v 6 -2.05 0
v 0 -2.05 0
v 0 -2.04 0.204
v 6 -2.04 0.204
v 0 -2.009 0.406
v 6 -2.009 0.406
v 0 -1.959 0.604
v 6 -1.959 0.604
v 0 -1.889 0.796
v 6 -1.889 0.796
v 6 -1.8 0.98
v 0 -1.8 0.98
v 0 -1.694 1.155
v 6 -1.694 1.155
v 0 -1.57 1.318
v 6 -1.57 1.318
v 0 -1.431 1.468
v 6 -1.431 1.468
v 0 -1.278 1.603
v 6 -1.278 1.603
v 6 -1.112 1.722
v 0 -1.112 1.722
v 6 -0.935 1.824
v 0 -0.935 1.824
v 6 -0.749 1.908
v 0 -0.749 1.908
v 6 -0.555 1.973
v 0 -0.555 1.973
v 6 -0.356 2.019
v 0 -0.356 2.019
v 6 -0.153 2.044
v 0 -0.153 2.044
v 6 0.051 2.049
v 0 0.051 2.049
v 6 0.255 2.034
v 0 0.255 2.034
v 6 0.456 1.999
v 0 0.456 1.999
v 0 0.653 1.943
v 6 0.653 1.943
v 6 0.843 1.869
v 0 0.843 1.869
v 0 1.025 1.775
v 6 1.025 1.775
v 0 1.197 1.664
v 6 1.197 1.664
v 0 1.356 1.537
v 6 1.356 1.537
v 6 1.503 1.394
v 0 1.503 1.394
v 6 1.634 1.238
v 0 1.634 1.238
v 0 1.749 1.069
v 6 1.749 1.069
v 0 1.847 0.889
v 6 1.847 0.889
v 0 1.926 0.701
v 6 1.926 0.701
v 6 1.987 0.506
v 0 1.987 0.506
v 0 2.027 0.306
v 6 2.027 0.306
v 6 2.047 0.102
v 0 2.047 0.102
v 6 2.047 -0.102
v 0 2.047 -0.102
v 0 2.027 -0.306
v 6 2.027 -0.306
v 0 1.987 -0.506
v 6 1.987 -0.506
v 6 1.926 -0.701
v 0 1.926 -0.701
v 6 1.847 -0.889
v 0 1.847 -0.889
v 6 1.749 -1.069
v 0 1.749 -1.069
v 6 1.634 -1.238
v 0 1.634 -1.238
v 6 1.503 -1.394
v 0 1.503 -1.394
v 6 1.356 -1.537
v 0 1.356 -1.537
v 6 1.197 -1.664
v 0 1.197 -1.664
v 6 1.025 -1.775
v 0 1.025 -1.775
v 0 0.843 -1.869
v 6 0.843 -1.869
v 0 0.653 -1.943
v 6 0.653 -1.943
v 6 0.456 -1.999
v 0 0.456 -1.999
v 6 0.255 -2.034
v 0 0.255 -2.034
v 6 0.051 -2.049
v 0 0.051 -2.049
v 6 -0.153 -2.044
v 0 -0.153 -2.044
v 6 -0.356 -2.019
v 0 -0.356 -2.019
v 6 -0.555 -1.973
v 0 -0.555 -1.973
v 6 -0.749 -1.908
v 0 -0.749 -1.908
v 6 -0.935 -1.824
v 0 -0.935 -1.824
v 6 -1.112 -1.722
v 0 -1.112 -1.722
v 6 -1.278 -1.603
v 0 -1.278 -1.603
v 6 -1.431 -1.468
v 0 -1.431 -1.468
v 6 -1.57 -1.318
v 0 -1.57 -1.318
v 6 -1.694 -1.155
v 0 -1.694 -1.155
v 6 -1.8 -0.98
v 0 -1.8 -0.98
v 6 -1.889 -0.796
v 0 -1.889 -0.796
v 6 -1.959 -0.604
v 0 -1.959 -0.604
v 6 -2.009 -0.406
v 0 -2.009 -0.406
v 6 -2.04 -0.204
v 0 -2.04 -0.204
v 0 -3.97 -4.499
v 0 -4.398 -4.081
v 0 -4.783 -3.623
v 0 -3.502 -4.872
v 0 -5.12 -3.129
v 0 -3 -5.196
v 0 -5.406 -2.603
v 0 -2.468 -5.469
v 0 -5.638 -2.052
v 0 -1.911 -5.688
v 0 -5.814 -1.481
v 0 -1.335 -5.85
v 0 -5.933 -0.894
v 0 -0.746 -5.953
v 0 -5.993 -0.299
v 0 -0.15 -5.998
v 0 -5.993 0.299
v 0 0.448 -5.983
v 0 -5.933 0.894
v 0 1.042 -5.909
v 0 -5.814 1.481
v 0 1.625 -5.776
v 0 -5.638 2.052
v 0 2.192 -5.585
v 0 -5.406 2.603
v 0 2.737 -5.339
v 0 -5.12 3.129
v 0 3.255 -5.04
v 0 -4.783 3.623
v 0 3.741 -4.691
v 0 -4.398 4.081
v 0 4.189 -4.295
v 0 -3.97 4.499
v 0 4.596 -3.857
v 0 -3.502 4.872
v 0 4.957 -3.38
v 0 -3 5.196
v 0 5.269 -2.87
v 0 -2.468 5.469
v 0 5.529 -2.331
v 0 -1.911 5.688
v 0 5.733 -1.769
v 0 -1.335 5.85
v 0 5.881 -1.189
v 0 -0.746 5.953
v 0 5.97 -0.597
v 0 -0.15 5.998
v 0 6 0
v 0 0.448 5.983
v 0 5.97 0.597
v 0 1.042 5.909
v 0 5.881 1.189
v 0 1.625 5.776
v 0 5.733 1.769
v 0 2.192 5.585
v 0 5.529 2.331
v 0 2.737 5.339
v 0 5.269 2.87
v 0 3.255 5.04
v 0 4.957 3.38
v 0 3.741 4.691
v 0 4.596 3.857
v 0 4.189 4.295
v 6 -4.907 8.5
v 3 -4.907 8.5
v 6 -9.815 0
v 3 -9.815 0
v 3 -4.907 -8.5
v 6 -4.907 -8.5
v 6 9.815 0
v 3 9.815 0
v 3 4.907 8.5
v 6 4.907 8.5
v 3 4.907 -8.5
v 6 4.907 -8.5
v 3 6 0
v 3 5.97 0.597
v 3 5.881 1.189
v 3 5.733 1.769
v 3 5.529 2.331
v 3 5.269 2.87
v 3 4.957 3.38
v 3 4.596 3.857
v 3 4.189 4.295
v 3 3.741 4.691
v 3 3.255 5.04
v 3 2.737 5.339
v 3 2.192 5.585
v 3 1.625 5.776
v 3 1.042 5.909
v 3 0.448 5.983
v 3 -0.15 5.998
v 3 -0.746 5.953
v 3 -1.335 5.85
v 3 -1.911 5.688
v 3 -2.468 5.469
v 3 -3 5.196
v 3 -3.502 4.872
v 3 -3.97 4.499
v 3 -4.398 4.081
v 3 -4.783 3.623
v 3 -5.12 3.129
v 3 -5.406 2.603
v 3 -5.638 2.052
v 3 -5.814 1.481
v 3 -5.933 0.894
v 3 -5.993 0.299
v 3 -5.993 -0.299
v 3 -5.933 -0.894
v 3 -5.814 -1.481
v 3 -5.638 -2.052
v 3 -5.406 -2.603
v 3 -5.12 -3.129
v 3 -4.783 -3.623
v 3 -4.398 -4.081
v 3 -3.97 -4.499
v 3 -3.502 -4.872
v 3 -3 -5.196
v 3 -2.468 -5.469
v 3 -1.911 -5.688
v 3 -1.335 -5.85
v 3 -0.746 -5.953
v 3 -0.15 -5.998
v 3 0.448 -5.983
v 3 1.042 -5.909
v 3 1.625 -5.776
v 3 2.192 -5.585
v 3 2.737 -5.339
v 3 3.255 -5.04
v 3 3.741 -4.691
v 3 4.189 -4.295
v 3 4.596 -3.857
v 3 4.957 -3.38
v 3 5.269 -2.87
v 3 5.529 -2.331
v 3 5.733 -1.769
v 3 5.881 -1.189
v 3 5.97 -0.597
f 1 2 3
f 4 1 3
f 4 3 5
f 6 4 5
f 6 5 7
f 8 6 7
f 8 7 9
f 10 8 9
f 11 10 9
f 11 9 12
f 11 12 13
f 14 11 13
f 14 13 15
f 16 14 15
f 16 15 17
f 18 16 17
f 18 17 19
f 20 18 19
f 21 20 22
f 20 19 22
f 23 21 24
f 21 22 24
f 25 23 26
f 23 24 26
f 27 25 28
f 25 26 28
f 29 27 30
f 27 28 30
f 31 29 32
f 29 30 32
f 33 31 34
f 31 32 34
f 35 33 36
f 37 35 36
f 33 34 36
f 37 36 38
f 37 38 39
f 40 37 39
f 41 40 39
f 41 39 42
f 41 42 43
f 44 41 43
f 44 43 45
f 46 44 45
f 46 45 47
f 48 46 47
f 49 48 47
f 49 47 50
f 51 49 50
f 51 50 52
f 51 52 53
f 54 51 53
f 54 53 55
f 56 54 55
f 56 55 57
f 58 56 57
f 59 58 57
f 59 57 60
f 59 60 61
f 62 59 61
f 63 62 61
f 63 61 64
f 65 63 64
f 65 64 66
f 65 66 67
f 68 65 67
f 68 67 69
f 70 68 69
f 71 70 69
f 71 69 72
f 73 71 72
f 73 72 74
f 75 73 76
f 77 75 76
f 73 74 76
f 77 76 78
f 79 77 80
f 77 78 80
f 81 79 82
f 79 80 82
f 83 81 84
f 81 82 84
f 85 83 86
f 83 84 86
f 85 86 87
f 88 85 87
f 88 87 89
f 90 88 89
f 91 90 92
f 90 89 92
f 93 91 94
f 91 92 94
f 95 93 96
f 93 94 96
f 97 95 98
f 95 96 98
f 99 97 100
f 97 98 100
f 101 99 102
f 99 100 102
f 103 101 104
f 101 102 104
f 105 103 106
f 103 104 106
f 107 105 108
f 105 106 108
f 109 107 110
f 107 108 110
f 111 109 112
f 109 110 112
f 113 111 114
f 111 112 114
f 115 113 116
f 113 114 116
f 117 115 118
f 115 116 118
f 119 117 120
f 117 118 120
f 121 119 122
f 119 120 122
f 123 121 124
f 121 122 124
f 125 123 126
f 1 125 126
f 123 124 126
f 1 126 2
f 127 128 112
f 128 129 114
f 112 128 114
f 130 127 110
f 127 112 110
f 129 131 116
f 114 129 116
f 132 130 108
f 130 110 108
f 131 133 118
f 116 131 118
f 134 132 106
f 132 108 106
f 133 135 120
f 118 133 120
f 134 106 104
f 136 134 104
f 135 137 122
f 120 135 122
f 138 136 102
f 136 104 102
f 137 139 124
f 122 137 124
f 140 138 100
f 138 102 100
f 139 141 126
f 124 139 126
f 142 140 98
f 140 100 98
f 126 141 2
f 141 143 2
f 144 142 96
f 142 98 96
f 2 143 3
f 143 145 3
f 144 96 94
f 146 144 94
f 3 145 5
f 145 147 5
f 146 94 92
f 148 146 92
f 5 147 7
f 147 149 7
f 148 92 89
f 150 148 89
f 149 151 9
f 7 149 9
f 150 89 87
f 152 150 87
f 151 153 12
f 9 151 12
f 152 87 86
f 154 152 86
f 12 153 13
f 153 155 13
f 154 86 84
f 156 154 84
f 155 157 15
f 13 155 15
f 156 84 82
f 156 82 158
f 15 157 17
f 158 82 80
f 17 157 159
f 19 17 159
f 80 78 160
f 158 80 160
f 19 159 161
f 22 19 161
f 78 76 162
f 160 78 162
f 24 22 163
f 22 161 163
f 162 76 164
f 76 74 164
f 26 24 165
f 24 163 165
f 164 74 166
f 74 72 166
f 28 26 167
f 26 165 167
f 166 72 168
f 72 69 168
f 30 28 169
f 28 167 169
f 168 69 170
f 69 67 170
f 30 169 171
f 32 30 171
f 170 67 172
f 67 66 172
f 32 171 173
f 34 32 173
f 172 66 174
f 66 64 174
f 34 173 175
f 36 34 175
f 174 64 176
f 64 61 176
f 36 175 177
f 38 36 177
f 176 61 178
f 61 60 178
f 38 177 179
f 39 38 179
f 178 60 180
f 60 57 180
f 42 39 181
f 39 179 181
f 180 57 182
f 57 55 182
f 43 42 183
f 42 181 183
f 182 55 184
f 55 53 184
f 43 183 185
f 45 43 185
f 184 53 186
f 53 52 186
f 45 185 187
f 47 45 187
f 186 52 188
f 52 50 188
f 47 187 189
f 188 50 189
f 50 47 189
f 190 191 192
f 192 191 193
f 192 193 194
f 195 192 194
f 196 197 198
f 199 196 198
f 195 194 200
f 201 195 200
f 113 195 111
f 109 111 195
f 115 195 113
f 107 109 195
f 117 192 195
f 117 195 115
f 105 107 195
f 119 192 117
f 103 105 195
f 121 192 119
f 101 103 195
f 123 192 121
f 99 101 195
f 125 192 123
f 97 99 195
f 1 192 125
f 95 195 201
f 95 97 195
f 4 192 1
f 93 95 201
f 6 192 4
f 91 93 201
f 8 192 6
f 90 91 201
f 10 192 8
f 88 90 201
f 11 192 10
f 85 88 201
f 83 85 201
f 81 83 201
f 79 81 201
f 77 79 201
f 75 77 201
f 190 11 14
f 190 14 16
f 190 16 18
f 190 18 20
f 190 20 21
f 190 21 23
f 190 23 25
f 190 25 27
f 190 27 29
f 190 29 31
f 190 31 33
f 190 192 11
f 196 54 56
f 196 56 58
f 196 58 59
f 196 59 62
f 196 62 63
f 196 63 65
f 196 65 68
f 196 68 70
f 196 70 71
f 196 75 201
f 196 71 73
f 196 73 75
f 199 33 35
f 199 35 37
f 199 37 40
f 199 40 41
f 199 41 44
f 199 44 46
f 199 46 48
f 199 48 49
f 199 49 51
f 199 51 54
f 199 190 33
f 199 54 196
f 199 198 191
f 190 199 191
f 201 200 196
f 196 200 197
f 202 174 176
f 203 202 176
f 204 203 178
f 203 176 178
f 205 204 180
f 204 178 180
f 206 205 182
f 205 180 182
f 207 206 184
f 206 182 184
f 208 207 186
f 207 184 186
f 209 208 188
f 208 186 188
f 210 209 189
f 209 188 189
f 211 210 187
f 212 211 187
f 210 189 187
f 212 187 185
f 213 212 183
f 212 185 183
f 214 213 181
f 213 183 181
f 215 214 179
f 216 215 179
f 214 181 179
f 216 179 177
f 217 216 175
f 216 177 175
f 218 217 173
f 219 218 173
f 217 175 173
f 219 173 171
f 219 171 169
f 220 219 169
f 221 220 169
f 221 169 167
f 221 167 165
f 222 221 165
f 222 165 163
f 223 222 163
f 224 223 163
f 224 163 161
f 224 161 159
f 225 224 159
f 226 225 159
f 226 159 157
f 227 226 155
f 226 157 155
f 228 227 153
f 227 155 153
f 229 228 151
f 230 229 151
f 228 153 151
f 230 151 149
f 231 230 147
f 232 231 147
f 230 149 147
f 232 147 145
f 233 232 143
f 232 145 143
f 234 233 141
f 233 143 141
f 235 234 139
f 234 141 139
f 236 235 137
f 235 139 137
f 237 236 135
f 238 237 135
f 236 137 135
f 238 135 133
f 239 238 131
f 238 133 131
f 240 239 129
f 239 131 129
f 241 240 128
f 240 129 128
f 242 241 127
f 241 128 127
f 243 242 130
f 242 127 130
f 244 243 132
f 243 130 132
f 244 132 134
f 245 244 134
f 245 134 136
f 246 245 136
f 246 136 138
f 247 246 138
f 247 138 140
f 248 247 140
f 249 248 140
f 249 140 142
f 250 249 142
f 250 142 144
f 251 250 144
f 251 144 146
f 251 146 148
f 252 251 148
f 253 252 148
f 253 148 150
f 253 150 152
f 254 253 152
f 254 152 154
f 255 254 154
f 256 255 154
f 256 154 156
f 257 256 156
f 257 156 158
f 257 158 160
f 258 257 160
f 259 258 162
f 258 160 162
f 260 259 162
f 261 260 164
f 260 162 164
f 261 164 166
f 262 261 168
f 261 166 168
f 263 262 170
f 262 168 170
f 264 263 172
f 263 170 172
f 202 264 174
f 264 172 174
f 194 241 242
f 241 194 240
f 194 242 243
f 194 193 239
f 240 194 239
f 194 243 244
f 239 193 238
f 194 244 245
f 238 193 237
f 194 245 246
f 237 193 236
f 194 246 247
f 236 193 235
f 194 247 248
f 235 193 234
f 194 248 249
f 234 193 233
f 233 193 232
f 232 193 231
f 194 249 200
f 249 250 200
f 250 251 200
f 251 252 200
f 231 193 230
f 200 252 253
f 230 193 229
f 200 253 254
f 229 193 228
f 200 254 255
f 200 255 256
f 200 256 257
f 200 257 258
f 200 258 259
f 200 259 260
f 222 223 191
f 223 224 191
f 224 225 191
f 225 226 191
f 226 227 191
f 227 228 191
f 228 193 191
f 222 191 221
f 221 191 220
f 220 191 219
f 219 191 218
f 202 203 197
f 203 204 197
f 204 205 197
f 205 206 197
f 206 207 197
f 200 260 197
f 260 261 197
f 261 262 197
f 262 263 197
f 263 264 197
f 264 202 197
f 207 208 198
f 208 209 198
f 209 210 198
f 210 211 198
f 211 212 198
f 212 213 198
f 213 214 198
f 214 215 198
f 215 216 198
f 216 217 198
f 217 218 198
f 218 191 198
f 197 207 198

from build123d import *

# Parameters (mm, degrees)
F0_R     = 6
F1_DEPTH = 3
F3_DEPTH = 3
F5_D     = 4.1


with BuildPart() as f1:
    # F0 (on Right) → F1 (new body)
    with BuildSketch(Plane.YZ):
        Circle(F0_R)
    extrude(amount=F1_DEPTH)

    # F2 (on face) → F3 (join)
    with BuildSketch(Plane.YZ.offset(3)):
        Polygon((4.9074772881, 8.5), (-4.9074772881, 8.5), (-9.8149545762, 0), (-4.9074772881, -8.5), (4.9074772881, -8.5), (9.8149545762, 0), align=None)
    extrude(amount=F3_DEPTH)

    # F5 (through all)
    with Locations(Plane.YZ.offset(6)):
        with Locations((0, 0)):
            Hole(F5_D / 2)


solid = f1.part
